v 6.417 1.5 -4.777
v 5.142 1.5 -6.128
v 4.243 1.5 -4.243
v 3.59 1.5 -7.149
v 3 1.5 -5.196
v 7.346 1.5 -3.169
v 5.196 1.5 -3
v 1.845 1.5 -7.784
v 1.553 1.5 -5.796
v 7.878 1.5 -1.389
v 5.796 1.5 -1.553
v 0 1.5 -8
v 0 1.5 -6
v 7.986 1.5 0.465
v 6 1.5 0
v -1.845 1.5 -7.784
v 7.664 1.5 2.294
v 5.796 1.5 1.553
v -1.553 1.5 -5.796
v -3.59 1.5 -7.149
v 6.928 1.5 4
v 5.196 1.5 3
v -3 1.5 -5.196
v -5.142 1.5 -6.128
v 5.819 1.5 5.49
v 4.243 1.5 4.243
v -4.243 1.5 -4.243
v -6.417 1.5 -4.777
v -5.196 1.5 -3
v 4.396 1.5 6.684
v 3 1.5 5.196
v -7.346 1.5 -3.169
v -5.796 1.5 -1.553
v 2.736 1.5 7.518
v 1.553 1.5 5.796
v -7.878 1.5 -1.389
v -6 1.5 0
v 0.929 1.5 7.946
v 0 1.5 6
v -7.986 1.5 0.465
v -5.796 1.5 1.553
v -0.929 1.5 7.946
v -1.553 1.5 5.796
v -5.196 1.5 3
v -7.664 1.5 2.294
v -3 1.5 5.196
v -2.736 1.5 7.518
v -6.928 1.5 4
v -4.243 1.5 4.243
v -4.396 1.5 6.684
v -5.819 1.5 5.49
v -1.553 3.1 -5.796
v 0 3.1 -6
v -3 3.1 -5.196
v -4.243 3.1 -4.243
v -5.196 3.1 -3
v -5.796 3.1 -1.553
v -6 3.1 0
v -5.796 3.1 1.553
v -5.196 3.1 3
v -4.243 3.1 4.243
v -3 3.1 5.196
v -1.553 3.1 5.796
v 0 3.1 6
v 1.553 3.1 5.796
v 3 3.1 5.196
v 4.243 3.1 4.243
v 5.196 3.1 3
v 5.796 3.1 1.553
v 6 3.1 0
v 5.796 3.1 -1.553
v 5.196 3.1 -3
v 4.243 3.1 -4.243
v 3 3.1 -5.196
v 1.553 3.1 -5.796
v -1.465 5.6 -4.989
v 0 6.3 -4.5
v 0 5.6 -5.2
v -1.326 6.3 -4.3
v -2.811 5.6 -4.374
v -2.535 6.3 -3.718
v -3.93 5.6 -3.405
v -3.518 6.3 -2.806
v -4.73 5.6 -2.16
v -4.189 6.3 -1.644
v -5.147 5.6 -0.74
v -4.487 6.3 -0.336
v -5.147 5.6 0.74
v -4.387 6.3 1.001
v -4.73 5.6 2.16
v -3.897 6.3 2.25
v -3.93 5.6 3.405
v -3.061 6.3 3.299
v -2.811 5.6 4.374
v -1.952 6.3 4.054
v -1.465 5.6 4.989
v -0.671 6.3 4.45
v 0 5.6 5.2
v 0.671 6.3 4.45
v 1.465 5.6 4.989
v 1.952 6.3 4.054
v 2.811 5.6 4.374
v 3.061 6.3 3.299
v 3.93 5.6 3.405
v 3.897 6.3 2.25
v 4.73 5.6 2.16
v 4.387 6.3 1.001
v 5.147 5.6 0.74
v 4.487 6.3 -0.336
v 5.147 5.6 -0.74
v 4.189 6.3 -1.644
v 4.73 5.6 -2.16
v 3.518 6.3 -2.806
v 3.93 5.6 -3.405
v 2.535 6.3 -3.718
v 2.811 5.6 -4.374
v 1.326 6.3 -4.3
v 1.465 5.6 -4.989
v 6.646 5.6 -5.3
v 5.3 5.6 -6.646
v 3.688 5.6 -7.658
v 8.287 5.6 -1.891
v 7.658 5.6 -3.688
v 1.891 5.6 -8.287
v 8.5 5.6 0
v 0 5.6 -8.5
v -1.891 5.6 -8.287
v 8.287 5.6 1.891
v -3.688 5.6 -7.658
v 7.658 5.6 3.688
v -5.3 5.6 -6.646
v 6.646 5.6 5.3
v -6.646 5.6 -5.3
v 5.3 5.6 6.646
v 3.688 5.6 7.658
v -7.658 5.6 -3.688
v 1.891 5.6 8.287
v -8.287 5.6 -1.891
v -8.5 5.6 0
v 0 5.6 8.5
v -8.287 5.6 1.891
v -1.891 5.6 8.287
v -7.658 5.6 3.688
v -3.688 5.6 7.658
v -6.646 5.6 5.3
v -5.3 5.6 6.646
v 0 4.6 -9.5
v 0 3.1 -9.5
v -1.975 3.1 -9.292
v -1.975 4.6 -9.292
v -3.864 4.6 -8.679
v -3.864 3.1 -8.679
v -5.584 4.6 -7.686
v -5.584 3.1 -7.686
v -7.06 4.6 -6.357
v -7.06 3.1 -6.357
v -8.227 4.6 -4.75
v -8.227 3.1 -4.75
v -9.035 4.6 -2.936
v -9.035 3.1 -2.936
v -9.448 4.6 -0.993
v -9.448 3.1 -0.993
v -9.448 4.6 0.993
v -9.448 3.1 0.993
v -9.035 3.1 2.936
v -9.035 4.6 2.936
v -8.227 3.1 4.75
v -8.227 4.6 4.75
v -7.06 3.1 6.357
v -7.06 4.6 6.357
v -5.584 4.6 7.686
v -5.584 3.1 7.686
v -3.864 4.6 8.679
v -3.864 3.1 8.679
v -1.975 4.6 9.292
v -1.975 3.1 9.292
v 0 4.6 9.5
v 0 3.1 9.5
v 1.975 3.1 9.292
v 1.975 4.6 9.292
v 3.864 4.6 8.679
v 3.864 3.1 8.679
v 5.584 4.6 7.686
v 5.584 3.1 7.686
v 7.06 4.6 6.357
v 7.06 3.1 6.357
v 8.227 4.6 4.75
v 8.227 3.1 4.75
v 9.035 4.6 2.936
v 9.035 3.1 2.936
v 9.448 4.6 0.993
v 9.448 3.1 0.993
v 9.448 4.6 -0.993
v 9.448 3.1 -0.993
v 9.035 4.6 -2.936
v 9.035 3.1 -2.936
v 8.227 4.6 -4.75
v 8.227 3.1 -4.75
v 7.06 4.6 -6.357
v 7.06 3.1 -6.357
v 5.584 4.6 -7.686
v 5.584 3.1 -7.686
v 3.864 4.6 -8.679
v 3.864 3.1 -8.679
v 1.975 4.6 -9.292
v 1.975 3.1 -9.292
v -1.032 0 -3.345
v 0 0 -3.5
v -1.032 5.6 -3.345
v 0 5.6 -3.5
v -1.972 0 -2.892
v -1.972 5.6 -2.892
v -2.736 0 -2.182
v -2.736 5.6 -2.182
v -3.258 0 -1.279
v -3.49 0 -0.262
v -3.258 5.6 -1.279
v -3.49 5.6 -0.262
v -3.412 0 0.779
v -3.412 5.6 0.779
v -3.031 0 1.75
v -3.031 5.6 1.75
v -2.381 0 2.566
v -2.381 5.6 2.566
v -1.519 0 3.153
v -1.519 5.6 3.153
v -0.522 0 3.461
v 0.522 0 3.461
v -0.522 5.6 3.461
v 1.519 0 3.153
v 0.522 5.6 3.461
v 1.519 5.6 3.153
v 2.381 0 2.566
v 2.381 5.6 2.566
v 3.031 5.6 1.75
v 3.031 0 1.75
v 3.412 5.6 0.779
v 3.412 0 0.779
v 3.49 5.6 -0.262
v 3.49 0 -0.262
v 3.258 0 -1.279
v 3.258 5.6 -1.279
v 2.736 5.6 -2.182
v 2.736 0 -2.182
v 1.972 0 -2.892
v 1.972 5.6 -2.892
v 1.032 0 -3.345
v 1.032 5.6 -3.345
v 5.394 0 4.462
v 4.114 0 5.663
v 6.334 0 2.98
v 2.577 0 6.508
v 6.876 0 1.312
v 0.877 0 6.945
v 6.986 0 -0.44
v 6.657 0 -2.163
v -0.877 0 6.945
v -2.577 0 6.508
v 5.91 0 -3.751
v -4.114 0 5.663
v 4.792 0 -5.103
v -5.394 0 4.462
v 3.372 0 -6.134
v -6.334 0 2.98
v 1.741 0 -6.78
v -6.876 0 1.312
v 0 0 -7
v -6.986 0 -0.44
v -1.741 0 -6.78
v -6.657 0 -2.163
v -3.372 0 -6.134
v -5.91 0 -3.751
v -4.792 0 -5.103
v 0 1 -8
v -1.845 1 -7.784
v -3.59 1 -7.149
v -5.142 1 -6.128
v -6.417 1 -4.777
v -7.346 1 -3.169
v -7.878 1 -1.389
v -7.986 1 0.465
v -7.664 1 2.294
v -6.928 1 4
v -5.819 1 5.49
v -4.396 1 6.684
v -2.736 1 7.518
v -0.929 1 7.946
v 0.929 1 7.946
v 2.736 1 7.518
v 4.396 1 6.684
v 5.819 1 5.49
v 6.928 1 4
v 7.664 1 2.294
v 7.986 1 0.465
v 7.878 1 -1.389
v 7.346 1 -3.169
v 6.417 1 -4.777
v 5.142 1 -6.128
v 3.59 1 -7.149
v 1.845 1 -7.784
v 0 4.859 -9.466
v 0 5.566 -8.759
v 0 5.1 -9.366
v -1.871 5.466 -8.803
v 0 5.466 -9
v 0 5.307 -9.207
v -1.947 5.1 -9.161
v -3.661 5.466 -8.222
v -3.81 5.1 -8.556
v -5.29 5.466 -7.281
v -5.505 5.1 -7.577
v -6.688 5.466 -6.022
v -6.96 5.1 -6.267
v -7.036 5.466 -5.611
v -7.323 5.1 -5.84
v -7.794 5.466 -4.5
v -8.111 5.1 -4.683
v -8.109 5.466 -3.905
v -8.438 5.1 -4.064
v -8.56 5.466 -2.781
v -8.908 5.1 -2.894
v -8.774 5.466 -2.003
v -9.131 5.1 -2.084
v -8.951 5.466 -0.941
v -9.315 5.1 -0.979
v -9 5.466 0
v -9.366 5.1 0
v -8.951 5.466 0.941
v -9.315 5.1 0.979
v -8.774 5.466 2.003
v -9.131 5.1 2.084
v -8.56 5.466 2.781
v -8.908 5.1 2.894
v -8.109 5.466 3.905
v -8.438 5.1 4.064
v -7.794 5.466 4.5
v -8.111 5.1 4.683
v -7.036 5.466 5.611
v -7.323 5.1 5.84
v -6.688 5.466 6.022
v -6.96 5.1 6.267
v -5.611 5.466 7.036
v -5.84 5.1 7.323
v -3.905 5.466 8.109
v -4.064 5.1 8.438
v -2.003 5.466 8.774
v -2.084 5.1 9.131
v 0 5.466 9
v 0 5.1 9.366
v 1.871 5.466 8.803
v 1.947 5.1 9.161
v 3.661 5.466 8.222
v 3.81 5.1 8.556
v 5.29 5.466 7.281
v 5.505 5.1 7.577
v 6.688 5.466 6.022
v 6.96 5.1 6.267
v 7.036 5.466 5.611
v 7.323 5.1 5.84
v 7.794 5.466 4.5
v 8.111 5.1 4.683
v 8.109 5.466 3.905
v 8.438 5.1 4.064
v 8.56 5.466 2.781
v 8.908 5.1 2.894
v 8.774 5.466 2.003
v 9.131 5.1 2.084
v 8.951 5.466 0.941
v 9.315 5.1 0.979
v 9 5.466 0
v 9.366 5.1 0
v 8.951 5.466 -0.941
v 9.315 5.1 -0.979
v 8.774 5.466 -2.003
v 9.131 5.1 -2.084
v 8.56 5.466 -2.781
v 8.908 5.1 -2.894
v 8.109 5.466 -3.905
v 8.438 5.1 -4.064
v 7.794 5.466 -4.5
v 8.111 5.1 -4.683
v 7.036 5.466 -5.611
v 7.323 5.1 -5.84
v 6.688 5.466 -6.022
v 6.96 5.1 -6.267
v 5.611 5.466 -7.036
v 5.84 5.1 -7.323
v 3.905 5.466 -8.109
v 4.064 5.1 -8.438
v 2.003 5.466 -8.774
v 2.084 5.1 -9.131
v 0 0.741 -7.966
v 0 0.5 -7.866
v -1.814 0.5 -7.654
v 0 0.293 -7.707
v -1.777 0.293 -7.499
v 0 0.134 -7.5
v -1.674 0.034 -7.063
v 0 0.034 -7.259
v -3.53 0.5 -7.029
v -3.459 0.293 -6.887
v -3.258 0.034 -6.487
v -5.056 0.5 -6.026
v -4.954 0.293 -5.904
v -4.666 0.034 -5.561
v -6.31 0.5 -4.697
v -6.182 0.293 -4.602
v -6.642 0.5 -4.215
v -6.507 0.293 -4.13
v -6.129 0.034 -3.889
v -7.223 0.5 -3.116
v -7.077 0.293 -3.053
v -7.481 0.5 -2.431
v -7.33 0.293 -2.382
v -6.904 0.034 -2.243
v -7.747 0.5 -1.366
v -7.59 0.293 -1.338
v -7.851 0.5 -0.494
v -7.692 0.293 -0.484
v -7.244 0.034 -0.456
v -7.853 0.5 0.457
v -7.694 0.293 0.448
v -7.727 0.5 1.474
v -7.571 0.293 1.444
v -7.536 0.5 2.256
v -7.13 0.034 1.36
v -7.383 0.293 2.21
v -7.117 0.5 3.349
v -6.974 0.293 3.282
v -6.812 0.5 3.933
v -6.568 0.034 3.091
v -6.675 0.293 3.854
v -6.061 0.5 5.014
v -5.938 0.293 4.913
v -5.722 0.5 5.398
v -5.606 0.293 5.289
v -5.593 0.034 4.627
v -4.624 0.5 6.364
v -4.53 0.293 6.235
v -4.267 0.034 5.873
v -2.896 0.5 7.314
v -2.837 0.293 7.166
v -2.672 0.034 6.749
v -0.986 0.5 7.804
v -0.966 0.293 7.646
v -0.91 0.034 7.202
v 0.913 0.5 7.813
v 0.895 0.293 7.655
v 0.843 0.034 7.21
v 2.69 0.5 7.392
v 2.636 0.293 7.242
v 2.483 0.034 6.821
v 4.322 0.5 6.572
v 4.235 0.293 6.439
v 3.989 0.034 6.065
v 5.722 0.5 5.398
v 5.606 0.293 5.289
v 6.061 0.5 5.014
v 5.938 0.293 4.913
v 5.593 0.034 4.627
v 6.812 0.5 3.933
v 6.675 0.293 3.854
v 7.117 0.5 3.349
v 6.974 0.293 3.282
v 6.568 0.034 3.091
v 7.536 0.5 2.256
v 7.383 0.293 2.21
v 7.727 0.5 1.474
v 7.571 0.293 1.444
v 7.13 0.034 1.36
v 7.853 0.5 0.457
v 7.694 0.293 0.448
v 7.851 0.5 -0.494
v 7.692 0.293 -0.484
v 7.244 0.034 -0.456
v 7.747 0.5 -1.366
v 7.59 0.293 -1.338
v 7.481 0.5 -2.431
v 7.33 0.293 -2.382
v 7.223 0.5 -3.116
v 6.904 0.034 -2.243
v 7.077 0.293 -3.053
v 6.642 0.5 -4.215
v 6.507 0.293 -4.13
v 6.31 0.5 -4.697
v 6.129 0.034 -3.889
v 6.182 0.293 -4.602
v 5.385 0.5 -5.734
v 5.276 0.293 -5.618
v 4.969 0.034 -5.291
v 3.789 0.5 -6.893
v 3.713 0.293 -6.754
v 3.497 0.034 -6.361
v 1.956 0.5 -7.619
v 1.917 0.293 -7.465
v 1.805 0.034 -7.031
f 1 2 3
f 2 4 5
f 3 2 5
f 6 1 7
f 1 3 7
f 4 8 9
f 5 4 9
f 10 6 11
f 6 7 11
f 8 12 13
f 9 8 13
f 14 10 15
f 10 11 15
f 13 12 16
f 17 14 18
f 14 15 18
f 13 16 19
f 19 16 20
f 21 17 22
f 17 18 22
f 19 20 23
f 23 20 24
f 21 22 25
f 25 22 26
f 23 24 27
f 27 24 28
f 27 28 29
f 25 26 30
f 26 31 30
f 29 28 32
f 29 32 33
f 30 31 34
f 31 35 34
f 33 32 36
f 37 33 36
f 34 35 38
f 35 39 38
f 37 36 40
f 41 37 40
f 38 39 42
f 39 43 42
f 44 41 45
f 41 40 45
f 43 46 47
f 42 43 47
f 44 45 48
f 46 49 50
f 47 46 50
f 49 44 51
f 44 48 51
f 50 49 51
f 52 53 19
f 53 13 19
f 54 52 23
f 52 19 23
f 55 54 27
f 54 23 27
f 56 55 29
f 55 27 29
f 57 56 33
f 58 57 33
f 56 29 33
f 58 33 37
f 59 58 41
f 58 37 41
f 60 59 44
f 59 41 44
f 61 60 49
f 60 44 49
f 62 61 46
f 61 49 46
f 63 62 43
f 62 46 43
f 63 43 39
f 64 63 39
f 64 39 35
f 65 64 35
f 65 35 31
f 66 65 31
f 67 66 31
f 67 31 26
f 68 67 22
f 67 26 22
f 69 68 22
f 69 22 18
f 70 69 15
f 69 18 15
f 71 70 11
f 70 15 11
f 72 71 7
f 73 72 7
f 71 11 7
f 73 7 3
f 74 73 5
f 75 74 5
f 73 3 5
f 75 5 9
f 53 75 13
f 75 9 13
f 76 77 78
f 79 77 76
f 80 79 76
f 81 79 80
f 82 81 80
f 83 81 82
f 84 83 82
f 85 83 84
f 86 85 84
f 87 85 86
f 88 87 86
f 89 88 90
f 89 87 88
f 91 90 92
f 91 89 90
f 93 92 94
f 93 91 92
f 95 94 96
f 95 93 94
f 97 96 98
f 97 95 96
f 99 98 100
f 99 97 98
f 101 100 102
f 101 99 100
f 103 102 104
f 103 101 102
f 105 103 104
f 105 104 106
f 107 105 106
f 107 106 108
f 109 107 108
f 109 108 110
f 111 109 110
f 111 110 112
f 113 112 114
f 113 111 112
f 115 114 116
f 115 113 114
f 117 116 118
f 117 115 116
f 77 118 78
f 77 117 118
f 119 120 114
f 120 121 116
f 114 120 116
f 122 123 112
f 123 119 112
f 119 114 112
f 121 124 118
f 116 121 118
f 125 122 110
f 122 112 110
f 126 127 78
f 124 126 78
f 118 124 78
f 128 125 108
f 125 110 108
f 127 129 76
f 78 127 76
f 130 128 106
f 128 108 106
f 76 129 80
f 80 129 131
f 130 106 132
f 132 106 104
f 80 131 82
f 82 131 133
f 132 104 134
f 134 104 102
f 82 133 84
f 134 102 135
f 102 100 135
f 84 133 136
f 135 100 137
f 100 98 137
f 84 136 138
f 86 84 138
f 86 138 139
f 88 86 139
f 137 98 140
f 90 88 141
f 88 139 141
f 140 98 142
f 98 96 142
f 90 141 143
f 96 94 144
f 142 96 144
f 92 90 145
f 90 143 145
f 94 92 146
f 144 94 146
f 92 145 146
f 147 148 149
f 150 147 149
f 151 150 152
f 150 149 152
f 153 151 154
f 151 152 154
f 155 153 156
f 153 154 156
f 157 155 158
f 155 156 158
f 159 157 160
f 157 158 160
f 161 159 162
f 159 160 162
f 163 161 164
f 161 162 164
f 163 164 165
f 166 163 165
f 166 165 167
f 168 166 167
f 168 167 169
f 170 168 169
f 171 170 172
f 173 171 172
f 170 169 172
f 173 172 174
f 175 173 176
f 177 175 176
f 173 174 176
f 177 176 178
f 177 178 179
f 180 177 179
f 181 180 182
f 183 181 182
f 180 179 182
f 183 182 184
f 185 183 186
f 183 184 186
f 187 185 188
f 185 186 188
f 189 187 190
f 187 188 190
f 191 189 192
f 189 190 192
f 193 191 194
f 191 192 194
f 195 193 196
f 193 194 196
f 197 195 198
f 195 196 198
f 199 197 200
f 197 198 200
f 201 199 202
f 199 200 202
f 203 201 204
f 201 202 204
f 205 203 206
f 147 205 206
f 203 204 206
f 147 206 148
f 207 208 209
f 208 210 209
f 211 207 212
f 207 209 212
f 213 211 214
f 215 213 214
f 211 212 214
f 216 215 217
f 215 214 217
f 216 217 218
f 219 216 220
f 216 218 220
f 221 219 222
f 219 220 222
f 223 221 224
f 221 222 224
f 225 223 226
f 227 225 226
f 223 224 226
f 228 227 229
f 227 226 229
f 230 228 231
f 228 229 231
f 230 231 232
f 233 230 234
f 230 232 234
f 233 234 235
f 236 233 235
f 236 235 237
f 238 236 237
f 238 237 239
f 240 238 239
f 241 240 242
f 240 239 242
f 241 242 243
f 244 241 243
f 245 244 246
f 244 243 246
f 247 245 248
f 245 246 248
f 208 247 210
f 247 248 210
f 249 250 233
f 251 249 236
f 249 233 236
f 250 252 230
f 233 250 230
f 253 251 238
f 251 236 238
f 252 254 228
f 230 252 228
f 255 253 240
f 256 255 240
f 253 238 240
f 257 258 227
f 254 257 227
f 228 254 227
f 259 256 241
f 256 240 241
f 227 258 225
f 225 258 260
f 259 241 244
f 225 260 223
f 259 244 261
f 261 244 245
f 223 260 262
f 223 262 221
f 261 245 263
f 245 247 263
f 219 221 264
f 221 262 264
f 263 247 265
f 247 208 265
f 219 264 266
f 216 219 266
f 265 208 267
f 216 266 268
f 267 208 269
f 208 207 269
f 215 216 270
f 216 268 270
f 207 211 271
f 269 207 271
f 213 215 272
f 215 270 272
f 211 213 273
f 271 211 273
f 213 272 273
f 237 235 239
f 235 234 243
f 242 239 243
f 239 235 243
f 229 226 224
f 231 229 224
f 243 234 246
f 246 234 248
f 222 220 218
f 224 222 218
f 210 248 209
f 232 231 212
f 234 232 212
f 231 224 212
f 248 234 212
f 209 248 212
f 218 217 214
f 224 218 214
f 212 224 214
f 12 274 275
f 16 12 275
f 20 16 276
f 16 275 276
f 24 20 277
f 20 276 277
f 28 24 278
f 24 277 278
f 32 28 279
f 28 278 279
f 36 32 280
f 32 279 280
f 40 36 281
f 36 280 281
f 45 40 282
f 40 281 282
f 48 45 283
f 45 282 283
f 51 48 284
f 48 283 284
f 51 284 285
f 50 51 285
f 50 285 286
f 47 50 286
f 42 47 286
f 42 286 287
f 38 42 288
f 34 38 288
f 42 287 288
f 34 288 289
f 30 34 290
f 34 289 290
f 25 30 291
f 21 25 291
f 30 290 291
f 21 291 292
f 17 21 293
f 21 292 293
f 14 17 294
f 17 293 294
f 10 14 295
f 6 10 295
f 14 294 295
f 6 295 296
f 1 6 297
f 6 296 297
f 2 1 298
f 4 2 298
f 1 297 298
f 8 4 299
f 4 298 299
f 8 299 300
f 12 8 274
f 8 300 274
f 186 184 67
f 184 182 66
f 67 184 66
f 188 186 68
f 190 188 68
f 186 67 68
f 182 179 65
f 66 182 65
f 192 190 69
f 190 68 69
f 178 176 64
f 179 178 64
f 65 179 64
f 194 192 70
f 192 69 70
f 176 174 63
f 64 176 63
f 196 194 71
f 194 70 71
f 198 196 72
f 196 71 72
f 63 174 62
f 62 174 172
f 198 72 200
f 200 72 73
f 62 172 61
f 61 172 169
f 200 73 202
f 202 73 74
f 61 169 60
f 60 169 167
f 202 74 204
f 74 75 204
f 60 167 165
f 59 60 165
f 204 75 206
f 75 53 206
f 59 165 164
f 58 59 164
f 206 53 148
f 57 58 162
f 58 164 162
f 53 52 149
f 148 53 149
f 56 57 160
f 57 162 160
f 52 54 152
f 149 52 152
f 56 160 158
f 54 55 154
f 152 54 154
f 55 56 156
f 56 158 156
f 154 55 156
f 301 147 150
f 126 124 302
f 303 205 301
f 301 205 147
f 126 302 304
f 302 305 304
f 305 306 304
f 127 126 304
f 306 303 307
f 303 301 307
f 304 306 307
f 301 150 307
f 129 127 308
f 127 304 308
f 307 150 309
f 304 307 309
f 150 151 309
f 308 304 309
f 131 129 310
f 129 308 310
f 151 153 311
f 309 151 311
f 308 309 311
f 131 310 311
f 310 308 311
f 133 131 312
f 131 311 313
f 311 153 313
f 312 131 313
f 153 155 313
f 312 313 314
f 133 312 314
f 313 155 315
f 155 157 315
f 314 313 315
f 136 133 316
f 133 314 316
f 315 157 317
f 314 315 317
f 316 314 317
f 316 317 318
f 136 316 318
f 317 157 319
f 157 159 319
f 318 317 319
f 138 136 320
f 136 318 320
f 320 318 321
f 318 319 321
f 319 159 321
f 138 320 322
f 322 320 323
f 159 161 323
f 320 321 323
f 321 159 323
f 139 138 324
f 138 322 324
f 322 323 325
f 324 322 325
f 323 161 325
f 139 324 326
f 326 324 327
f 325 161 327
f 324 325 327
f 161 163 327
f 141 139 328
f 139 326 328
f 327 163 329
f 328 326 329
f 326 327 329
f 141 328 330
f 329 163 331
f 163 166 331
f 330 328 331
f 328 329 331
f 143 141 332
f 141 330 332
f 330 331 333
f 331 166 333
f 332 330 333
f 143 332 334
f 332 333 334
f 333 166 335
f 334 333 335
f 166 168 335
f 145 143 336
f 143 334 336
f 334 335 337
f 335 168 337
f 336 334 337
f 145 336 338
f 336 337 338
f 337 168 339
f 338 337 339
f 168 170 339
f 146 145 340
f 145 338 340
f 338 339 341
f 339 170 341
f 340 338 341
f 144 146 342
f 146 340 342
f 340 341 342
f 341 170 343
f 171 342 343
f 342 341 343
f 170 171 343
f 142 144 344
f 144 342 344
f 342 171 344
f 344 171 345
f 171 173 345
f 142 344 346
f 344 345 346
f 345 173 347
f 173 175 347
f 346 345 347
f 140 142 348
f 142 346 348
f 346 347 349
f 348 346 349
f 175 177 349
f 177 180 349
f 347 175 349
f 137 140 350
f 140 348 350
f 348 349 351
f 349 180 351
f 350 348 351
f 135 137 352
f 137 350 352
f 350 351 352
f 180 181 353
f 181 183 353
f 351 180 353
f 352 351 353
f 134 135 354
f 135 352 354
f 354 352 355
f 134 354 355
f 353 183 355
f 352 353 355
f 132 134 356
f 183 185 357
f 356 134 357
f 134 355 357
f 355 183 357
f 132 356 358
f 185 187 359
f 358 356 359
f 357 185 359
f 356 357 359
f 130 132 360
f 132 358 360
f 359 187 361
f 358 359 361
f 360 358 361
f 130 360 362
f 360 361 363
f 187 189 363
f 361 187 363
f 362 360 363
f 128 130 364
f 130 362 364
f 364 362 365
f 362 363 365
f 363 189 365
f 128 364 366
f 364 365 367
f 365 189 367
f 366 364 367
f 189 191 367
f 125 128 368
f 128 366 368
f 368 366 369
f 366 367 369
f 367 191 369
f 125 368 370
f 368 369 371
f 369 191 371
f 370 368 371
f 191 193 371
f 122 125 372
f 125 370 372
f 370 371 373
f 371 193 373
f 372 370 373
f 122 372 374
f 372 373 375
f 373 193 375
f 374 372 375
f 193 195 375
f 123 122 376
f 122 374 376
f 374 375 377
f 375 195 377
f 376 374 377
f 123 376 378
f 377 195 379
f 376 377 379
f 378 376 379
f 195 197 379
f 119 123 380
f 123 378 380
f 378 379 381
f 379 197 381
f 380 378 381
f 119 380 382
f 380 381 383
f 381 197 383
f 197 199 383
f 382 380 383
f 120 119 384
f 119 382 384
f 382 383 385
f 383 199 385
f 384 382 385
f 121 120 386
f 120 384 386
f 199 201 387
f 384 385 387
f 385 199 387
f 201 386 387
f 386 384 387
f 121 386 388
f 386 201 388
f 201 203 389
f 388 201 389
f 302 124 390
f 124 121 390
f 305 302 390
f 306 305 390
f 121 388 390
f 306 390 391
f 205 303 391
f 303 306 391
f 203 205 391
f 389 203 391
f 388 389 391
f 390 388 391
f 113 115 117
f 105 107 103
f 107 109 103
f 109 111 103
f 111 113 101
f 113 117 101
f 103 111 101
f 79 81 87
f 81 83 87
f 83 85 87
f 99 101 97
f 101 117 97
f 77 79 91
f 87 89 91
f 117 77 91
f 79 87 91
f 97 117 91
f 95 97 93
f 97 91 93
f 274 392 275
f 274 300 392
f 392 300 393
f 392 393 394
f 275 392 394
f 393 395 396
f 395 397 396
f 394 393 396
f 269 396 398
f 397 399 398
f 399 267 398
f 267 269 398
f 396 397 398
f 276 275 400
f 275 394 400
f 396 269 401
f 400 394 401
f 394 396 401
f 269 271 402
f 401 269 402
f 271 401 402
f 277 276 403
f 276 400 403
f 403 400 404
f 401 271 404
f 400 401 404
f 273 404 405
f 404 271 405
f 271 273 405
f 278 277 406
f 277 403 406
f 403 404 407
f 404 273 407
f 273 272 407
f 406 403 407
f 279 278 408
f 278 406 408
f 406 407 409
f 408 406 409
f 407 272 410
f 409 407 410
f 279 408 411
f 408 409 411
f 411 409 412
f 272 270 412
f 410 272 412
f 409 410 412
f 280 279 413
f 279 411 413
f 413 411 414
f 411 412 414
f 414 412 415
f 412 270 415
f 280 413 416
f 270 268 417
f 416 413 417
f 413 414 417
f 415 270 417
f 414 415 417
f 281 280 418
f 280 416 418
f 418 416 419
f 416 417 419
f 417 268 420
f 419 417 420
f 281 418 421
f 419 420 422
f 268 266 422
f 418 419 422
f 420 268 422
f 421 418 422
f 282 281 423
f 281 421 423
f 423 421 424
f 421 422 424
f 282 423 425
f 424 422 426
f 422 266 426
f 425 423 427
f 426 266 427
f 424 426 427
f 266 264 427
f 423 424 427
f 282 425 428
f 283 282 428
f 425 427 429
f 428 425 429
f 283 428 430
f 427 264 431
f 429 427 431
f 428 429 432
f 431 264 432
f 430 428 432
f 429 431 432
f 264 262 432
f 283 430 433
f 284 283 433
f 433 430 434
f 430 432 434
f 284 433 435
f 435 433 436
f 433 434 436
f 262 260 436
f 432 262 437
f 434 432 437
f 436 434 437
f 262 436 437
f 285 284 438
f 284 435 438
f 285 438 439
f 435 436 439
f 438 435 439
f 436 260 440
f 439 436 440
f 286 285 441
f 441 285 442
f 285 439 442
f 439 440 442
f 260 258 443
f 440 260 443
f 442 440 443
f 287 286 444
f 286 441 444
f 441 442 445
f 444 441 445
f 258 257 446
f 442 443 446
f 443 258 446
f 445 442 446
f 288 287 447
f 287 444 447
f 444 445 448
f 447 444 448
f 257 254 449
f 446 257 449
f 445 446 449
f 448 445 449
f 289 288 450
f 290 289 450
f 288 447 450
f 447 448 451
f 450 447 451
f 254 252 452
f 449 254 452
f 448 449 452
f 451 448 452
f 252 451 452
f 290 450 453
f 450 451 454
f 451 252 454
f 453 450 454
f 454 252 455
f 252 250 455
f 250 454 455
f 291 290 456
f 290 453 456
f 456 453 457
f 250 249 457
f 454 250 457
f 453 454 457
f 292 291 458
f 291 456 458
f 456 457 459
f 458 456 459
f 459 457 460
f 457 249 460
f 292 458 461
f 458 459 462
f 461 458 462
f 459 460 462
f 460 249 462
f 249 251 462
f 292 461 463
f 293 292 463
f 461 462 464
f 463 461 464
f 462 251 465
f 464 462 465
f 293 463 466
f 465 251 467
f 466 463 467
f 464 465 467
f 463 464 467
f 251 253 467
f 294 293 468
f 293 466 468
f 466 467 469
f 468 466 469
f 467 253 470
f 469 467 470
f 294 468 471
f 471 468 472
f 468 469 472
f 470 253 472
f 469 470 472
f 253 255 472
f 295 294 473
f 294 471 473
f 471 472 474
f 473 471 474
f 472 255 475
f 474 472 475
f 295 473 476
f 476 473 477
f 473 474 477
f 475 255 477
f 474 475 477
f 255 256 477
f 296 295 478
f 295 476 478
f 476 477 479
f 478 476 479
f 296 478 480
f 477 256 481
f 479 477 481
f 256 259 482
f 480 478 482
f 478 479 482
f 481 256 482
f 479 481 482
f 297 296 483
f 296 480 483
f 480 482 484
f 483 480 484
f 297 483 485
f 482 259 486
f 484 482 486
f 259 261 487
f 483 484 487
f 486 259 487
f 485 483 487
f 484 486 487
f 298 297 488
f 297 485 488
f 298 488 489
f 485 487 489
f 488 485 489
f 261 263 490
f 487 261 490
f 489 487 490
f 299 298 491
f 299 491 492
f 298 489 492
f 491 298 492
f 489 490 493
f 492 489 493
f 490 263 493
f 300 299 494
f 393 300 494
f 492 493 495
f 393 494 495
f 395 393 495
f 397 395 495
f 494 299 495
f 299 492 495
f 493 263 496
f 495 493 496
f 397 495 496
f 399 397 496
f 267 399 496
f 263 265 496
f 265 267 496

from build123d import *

# Parameters (mm, degrees)
FILLET_1_R     = 1
CHAMFER_1_SIZE = 0.7


with BuildPart() as part:
    # ｽｹｯﾁ1 → 回転1 (revolve)
    with BuildSketch(Plane.XY, mode=Mode.PRIVATE) as revolve_1_sk:
        Polygon((0, 6.3), (4.5, 6.3), (4.5, 5.6), (9.5, 5.6), (9.5, 3.1), (6, 3.1), (6, 1.5), (8, 1.5), (8, 0), (3.5, 0), (3.5, 5.6), (0, 5.6), align=None)
    revolve(revolve_1_sk.sketch.rotate(Axis((0, 0, 0), (0, 1, 0)), 90), axis=Axis((0, 0, 0), (0, 1, 0)))

    # ﾌｨﾚｯﾄ1
    fillet_1_edges = [part.edges().sort_by_distance(p)[0] for p in [
        (0, 0, 8),
        (0, 5.6, 9.5),
    ]]
    fillet(fillet_1_edges, radius=FILLET_1_R)

    # 面取り1
    chamfer_1_edges = [part.edges().sort_by_distance(p)[0] for p in [
        (0, 5.6, 4.5),
    ]]
    chamfer(chamfer_1_edges, length=CHAMFER_1_SIZE - 0.0001)  # a hair under: the kernel refuses the full size


solid = part.part
